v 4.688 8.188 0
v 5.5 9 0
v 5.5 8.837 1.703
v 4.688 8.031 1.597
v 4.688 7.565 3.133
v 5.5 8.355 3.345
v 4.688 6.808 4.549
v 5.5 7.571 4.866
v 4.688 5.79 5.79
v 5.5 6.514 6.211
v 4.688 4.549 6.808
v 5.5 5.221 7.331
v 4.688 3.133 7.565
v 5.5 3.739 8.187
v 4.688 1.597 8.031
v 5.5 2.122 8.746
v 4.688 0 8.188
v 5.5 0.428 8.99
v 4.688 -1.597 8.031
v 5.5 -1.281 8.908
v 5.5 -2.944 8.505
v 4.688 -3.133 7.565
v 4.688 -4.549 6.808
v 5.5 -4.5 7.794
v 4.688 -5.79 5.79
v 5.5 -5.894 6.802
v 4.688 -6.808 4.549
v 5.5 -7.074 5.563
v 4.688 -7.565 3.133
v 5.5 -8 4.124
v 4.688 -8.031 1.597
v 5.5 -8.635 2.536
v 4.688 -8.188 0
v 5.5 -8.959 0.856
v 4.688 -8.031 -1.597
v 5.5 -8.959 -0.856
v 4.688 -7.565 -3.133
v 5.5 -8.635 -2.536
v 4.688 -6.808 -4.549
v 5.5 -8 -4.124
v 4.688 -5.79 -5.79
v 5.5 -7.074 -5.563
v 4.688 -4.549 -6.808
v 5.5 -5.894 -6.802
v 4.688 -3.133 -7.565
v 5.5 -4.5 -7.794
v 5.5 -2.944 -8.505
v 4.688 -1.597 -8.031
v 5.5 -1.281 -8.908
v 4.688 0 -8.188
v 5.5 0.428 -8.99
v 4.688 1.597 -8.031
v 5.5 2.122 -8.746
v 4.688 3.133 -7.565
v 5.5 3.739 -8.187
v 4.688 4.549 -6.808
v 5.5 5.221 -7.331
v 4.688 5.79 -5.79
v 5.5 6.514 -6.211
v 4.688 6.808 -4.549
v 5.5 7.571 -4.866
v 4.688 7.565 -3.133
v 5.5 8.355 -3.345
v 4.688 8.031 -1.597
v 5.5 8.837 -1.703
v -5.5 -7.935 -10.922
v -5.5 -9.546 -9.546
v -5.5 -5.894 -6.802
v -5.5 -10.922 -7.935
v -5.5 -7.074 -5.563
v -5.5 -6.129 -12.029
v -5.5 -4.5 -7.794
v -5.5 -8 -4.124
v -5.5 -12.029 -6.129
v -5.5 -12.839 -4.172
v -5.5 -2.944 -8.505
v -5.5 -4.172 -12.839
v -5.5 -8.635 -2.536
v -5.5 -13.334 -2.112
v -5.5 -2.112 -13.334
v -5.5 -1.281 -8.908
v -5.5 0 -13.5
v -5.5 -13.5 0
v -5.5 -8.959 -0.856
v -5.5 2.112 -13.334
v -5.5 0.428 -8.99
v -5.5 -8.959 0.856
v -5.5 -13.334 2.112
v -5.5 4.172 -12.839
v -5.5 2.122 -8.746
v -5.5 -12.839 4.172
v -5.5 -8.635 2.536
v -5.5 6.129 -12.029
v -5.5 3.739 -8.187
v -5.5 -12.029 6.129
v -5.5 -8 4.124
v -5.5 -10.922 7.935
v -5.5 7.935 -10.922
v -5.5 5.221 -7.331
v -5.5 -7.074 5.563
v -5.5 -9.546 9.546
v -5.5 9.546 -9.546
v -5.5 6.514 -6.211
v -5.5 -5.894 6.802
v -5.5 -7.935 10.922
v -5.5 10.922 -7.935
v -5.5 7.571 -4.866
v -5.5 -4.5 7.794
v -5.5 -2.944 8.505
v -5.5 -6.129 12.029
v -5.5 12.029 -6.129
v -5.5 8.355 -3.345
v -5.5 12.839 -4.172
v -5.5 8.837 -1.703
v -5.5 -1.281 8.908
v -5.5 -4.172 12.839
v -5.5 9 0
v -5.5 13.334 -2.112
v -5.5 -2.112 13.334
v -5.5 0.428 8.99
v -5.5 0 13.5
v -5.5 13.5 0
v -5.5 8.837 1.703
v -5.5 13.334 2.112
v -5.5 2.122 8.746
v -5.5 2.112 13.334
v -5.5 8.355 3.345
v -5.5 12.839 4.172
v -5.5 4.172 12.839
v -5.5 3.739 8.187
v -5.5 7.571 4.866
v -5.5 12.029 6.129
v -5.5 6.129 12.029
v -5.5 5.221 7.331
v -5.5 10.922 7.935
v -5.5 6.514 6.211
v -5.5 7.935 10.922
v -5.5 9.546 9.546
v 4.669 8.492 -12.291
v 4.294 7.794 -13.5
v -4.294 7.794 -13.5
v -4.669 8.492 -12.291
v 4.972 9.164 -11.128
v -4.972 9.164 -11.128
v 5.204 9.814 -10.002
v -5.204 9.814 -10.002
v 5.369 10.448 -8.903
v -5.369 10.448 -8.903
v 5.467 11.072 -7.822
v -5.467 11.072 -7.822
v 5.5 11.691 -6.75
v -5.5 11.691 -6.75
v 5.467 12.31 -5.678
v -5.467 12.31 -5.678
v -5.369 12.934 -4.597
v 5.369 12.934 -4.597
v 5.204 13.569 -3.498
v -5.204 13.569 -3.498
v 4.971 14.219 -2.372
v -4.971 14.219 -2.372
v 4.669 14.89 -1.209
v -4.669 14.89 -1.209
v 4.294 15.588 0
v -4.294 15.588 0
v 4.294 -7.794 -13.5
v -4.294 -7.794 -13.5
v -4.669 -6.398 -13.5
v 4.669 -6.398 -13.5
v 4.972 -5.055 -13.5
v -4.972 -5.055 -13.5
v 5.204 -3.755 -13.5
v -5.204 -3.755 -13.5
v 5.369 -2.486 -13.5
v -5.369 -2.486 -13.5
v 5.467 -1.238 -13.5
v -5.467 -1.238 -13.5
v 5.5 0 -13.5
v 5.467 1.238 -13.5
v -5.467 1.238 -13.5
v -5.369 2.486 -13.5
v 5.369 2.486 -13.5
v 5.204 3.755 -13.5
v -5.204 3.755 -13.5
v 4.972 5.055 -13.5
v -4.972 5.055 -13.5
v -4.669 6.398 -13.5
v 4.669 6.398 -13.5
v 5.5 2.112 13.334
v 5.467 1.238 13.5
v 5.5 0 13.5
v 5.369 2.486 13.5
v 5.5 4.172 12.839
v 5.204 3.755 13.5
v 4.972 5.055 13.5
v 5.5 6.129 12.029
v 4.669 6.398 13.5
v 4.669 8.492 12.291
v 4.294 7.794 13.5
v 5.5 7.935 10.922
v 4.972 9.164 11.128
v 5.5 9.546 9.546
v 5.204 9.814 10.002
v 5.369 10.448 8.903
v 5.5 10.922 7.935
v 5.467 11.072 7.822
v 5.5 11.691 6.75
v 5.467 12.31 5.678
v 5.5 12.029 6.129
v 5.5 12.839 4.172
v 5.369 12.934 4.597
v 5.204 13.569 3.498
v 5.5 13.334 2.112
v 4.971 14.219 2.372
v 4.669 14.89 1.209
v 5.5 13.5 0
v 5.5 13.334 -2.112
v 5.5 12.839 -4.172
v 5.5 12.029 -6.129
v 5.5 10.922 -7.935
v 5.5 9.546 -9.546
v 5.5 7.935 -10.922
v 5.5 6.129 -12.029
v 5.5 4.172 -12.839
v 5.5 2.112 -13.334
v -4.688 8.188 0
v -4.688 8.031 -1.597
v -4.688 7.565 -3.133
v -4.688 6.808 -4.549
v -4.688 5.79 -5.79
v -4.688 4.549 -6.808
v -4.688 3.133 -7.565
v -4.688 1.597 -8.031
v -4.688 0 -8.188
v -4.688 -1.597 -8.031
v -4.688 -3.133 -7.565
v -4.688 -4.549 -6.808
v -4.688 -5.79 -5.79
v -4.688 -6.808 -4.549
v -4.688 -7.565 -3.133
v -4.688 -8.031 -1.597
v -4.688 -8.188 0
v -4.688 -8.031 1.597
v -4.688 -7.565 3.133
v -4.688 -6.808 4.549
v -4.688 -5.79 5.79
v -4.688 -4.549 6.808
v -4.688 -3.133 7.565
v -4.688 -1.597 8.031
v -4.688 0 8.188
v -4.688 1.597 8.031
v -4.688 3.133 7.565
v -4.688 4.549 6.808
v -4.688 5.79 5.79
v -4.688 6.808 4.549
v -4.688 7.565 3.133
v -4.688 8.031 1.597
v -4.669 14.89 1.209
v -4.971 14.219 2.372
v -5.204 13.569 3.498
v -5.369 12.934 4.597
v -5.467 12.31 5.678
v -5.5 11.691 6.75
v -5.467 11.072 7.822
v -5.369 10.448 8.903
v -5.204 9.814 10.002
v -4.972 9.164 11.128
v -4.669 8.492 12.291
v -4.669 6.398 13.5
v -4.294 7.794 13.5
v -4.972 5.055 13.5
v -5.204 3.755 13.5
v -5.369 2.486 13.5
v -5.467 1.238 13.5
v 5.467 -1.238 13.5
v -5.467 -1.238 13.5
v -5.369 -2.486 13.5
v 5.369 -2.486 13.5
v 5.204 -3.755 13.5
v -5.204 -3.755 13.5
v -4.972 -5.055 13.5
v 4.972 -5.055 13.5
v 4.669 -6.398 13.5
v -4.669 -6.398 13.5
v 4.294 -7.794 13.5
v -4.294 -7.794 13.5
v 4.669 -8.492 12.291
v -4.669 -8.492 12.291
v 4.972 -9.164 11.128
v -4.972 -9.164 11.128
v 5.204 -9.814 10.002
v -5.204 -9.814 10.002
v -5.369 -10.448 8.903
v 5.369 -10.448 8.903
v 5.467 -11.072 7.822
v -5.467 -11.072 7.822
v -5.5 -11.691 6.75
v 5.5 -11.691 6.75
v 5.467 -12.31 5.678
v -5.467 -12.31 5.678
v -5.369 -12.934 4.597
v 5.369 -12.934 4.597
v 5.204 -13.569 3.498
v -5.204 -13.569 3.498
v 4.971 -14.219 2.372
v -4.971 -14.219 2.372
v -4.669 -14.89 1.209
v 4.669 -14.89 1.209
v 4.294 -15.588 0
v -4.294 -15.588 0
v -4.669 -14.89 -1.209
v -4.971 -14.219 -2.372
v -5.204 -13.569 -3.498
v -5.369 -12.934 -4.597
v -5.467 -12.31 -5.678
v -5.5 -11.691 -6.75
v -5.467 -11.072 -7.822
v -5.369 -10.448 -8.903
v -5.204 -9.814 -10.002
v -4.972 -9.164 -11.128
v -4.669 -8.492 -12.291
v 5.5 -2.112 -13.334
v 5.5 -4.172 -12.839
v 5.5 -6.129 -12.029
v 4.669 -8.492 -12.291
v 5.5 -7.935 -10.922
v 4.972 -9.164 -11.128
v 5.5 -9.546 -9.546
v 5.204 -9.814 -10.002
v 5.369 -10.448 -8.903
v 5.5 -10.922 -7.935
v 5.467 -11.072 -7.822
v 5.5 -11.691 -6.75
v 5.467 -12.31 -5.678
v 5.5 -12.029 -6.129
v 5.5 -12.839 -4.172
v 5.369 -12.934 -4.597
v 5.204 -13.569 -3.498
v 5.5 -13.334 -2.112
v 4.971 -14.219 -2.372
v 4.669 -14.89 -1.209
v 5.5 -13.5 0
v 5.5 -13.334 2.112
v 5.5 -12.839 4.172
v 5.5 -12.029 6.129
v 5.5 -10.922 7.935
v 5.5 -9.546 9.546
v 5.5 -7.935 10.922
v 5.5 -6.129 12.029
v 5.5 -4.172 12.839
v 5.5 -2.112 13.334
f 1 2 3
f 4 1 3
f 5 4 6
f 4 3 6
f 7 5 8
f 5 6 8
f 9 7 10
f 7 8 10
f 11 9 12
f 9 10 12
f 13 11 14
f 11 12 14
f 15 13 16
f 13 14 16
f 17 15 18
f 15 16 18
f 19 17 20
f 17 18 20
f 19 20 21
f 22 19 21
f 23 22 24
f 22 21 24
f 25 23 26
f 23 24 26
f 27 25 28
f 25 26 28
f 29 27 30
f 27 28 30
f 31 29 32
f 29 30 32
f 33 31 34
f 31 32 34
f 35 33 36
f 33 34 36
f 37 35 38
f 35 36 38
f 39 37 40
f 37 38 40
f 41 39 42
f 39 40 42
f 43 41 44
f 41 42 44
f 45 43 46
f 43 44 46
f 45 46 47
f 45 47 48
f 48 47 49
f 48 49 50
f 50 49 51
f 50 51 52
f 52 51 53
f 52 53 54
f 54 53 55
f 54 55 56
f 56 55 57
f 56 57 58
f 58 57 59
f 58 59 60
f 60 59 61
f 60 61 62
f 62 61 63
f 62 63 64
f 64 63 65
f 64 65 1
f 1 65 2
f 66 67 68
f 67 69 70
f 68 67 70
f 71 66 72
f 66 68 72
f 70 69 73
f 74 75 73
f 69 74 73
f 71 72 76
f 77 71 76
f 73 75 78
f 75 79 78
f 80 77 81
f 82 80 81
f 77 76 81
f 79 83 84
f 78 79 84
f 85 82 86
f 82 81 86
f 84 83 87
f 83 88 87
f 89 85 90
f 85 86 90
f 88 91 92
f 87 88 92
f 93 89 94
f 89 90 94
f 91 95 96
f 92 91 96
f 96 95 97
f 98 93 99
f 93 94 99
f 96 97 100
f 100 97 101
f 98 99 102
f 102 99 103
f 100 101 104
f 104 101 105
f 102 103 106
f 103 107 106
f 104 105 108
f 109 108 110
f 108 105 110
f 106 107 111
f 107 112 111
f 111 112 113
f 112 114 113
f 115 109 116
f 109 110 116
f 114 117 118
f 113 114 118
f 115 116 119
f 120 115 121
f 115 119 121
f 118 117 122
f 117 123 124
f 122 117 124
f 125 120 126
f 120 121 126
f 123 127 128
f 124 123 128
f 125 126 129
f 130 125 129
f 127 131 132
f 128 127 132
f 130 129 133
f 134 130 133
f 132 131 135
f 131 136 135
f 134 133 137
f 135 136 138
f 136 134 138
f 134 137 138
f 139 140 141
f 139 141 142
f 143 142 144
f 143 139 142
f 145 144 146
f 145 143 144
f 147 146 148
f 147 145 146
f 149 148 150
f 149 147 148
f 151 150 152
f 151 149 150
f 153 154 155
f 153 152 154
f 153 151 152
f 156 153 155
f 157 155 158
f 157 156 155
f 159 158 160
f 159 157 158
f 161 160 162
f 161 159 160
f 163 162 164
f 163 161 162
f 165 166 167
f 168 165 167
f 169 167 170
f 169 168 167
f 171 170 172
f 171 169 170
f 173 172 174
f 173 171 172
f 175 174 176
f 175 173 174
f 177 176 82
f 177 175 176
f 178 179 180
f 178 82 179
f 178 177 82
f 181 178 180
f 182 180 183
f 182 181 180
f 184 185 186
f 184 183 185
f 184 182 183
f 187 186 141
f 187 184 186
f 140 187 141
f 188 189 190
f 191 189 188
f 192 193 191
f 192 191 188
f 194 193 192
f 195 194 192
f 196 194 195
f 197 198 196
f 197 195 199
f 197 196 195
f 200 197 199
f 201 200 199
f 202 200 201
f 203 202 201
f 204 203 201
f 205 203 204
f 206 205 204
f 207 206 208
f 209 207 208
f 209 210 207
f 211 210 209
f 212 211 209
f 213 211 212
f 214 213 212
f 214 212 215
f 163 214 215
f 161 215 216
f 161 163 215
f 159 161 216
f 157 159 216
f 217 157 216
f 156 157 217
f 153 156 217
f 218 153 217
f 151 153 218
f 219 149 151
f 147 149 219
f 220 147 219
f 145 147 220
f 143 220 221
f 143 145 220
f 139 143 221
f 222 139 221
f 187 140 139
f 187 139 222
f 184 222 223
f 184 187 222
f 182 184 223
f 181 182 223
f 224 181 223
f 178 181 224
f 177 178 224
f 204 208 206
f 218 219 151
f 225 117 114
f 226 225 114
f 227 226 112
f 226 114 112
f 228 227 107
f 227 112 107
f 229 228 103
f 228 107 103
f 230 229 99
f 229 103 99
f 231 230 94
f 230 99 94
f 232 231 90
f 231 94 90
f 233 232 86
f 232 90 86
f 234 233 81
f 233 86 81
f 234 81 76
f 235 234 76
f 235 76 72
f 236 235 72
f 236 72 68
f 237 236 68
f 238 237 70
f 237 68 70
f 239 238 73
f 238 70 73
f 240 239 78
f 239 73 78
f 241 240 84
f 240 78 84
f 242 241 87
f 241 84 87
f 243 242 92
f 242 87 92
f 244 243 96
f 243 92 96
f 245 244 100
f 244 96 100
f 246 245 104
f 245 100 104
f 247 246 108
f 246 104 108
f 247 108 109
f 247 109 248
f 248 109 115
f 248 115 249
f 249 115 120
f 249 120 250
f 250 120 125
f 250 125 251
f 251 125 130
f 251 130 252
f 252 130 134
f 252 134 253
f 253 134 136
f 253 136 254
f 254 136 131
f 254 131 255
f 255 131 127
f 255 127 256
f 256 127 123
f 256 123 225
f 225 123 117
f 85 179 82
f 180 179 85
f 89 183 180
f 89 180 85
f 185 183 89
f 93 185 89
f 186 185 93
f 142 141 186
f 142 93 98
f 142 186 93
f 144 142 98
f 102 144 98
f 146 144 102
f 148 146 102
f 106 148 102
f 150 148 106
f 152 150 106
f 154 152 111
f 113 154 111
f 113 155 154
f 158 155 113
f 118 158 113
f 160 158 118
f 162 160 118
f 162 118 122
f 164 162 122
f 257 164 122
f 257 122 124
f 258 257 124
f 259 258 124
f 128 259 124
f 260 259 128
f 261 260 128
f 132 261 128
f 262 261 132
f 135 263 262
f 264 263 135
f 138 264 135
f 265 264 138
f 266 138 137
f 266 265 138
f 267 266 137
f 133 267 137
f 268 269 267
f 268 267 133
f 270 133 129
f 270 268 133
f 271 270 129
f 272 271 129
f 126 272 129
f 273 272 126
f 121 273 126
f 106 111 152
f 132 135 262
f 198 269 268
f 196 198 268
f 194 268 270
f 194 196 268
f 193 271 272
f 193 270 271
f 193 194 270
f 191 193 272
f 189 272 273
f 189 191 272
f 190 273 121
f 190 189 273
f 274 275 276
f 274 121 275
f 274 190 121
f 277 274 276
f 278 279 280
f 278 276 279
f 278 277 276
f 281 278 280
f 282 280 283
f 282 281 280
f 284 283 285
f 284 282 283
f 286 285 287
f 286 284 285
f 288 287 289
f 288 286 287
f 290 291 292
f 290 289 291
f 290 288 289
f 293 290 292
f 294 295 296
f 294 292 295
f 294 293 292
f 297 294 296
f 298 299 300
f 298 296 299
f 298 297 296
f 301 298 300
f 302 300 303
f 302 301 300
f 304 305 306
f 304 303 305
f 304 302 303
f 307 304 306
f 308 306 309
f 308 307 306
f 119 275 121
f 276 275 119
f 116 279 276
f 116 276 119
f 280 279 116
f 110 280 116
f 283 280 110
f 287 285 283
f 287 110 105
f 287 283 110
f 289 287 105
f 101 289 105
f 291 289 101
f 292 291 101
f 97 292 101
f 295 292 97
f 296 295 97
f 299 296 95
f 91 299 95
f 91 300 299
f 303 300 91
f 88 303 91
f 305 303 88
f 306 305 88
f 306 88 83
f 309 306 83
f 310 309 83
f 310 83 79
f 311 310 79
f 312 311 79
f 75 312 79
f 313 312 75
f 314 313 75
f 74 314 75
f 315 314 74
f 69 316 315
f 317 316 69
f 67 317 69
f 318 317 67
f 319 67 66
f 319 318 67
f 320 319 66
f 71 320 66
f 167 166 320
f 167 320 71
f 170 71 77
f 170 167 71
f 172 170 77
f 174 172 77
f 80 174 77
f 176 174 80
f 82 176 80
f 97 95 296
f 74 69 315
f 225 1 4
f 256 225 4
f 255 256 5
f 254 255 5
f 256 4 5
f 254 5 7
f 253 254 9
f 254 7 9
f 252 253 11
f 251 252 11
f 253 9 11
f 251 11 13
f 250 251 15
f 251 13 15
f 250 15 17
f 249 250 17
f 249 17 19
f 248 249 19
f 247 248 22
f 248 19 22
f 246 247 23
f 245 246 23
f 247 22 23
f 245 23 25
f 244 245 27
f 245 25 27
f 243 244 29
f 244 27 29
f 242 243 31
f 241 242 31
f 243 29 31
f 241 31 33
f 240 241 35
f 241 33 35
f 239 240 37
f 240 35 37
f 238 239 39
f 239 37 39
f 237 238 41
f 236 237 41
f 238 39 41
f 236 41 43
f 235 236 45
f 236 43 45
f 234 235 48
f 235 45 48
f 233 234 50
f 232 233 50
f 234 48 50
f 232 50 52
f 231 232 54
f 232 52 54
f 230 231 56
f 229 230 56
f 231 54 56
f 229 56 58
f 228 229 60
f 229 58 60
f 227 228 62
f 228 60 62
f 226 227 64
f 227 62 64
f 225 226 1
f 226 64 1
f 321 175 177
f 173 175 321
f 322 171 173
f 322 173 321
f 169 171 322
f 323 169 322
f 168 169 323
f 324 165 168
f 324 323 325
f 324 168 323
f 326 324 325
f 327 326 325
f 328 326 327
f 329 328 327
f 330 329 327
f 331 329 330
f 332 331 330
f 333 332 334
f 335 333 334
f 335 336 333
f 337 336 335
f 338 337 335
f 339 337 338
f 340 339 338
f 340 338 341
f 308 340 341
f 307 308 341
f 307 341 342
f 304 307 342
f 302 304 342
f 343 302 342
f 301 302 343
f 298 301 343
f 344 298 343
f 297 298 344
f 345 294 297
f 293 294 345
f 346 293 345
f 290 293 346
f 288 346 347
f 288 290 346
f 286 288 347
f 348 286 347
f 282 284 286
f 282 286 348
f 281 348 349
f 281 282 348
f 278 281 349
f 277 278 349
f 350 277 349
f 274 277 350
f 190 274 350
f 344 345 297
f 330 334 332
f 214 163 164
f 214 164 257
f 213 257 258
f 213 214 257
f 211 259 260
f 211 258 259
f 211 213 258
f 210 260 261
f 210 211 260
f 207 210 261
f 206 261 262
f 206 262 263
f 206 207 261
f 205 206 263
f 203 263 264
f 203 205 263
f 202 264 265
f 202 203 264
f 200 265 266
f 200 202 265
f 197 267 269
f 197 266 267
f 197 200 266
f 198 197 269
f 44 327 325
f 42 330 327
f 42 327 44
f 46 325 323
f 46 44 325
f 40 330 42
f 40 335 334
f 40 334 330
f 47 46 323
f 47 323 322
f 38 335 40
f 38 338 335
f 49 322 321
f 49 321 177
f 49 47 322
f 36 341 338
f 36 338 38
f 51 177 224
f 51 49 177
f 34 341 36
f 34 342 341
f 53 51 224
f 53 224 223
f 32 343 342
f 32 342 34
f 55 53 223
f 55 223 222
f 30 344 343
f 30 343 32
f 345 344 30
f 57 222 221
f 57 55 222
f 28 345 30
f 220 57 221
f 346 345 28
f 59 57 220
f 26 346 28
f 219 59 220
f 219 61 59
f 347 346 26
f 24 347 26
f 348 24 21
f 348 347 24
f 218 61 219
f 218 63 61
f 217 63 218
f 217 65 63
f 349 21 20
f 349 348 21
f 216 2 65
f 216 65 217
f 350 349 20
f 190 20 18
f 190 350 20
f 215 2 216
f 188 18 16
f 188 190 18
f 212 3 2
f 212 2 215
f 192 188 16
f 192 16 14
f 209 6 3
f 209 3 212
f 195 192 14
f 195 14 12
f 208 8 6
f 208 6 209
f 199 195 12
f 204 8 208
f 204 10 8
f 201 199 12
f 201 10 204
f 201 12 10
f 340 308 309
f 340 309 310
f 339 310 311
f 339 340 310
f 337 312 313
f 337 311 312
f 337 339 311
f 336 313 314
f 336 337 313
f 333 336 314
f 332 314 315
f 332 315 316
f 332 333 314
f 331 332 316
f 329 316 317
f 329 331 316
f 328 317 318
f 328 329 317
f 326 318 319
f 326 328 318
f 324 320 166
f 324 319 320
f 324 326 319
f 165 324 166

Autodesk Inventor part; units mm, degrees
sketch "Sketch_1" plane through (0, 0, 0) normal (0, 0, 1) x (1, 0, 0)
  line L0 (5.5, 0) -> (-5.5, 0)
  line L1 (-5.5, 13.5) -> (-5.5, 9)
  line L2 (-5.5, 9) -> (-4.688, 8.188)
  line L3 (-4.688, 8.188) -> (4.688, 8.188)
  line L4 (4.688, 8.188) -> (5.5, 9)
  line L5 (5.5, 9) -> (5.5, 13.5)
  line L6 (5.5, 13.5) -> (3.7102, 16.6)
  line L7 (3.7102, 16.6) -> (-3.7102, 16.6)
  line L8 (-3.7102, 16.6) -> (-5.5, 13.5)
revolve "Revolution1" add sketch "Sketch_1" angle 360 about axis through (5.5, 0, 0) along (1, 0, 0)
thread "Thread1" size "M18x1.5" class "6H" standard "ISO Metric profile" full length
sketch "Sketch_2" plane through (0, 0, 0) normal (1, 0, 0) x (0, 1, 0)
  circle A0 centre (0, 0) radius 50
  line L0 (-7.7942, 13.5) -> (-15.5885, 0)
  line L1 (-15.5885, 0) -> (-7.7942, -13.5)
  line L2 (-7.7942, -13.5) -> (7.7942, -13.5)
  line L3 (7.7942, -13.5) -> (15.5885, 0)
  line L4 (15.5885, 0) -> (7.7942, 13.5)
  line L5 (7.7942, 13.5) -> (-7.7942, 13.5)
extrude "Extrusion1" cut sketch "Sketch_2" along normal mid plane 22
ref_plane "B1_XY" through (5.5, 0, 13.5) normal (1, 0, 0) x (0, 0, -1)
ref_plane "B1_YZ" through (5.5, 0, 13.5) normal (0, 0, -1) x (0, 1, 0)
ref_plane "B1_ZX" through (5.5, 0, 13.5) normal (0, 1, 0) x (1, 0, 0)
ref_plane "N_R_XY" through (0, 0, 0) normal (1, 0, 0) x (0, 0, -1)
ref_plane "N_R_YZ" through (0, 0, 0) normal (0, 0, -1) x (0, 1, 0)
ref_plane "N_R_ZX" through (0, 0, 0) normal (0, 1, 0) x (1, 0, 0)
properties part number "NT-05(63)_CE2"
